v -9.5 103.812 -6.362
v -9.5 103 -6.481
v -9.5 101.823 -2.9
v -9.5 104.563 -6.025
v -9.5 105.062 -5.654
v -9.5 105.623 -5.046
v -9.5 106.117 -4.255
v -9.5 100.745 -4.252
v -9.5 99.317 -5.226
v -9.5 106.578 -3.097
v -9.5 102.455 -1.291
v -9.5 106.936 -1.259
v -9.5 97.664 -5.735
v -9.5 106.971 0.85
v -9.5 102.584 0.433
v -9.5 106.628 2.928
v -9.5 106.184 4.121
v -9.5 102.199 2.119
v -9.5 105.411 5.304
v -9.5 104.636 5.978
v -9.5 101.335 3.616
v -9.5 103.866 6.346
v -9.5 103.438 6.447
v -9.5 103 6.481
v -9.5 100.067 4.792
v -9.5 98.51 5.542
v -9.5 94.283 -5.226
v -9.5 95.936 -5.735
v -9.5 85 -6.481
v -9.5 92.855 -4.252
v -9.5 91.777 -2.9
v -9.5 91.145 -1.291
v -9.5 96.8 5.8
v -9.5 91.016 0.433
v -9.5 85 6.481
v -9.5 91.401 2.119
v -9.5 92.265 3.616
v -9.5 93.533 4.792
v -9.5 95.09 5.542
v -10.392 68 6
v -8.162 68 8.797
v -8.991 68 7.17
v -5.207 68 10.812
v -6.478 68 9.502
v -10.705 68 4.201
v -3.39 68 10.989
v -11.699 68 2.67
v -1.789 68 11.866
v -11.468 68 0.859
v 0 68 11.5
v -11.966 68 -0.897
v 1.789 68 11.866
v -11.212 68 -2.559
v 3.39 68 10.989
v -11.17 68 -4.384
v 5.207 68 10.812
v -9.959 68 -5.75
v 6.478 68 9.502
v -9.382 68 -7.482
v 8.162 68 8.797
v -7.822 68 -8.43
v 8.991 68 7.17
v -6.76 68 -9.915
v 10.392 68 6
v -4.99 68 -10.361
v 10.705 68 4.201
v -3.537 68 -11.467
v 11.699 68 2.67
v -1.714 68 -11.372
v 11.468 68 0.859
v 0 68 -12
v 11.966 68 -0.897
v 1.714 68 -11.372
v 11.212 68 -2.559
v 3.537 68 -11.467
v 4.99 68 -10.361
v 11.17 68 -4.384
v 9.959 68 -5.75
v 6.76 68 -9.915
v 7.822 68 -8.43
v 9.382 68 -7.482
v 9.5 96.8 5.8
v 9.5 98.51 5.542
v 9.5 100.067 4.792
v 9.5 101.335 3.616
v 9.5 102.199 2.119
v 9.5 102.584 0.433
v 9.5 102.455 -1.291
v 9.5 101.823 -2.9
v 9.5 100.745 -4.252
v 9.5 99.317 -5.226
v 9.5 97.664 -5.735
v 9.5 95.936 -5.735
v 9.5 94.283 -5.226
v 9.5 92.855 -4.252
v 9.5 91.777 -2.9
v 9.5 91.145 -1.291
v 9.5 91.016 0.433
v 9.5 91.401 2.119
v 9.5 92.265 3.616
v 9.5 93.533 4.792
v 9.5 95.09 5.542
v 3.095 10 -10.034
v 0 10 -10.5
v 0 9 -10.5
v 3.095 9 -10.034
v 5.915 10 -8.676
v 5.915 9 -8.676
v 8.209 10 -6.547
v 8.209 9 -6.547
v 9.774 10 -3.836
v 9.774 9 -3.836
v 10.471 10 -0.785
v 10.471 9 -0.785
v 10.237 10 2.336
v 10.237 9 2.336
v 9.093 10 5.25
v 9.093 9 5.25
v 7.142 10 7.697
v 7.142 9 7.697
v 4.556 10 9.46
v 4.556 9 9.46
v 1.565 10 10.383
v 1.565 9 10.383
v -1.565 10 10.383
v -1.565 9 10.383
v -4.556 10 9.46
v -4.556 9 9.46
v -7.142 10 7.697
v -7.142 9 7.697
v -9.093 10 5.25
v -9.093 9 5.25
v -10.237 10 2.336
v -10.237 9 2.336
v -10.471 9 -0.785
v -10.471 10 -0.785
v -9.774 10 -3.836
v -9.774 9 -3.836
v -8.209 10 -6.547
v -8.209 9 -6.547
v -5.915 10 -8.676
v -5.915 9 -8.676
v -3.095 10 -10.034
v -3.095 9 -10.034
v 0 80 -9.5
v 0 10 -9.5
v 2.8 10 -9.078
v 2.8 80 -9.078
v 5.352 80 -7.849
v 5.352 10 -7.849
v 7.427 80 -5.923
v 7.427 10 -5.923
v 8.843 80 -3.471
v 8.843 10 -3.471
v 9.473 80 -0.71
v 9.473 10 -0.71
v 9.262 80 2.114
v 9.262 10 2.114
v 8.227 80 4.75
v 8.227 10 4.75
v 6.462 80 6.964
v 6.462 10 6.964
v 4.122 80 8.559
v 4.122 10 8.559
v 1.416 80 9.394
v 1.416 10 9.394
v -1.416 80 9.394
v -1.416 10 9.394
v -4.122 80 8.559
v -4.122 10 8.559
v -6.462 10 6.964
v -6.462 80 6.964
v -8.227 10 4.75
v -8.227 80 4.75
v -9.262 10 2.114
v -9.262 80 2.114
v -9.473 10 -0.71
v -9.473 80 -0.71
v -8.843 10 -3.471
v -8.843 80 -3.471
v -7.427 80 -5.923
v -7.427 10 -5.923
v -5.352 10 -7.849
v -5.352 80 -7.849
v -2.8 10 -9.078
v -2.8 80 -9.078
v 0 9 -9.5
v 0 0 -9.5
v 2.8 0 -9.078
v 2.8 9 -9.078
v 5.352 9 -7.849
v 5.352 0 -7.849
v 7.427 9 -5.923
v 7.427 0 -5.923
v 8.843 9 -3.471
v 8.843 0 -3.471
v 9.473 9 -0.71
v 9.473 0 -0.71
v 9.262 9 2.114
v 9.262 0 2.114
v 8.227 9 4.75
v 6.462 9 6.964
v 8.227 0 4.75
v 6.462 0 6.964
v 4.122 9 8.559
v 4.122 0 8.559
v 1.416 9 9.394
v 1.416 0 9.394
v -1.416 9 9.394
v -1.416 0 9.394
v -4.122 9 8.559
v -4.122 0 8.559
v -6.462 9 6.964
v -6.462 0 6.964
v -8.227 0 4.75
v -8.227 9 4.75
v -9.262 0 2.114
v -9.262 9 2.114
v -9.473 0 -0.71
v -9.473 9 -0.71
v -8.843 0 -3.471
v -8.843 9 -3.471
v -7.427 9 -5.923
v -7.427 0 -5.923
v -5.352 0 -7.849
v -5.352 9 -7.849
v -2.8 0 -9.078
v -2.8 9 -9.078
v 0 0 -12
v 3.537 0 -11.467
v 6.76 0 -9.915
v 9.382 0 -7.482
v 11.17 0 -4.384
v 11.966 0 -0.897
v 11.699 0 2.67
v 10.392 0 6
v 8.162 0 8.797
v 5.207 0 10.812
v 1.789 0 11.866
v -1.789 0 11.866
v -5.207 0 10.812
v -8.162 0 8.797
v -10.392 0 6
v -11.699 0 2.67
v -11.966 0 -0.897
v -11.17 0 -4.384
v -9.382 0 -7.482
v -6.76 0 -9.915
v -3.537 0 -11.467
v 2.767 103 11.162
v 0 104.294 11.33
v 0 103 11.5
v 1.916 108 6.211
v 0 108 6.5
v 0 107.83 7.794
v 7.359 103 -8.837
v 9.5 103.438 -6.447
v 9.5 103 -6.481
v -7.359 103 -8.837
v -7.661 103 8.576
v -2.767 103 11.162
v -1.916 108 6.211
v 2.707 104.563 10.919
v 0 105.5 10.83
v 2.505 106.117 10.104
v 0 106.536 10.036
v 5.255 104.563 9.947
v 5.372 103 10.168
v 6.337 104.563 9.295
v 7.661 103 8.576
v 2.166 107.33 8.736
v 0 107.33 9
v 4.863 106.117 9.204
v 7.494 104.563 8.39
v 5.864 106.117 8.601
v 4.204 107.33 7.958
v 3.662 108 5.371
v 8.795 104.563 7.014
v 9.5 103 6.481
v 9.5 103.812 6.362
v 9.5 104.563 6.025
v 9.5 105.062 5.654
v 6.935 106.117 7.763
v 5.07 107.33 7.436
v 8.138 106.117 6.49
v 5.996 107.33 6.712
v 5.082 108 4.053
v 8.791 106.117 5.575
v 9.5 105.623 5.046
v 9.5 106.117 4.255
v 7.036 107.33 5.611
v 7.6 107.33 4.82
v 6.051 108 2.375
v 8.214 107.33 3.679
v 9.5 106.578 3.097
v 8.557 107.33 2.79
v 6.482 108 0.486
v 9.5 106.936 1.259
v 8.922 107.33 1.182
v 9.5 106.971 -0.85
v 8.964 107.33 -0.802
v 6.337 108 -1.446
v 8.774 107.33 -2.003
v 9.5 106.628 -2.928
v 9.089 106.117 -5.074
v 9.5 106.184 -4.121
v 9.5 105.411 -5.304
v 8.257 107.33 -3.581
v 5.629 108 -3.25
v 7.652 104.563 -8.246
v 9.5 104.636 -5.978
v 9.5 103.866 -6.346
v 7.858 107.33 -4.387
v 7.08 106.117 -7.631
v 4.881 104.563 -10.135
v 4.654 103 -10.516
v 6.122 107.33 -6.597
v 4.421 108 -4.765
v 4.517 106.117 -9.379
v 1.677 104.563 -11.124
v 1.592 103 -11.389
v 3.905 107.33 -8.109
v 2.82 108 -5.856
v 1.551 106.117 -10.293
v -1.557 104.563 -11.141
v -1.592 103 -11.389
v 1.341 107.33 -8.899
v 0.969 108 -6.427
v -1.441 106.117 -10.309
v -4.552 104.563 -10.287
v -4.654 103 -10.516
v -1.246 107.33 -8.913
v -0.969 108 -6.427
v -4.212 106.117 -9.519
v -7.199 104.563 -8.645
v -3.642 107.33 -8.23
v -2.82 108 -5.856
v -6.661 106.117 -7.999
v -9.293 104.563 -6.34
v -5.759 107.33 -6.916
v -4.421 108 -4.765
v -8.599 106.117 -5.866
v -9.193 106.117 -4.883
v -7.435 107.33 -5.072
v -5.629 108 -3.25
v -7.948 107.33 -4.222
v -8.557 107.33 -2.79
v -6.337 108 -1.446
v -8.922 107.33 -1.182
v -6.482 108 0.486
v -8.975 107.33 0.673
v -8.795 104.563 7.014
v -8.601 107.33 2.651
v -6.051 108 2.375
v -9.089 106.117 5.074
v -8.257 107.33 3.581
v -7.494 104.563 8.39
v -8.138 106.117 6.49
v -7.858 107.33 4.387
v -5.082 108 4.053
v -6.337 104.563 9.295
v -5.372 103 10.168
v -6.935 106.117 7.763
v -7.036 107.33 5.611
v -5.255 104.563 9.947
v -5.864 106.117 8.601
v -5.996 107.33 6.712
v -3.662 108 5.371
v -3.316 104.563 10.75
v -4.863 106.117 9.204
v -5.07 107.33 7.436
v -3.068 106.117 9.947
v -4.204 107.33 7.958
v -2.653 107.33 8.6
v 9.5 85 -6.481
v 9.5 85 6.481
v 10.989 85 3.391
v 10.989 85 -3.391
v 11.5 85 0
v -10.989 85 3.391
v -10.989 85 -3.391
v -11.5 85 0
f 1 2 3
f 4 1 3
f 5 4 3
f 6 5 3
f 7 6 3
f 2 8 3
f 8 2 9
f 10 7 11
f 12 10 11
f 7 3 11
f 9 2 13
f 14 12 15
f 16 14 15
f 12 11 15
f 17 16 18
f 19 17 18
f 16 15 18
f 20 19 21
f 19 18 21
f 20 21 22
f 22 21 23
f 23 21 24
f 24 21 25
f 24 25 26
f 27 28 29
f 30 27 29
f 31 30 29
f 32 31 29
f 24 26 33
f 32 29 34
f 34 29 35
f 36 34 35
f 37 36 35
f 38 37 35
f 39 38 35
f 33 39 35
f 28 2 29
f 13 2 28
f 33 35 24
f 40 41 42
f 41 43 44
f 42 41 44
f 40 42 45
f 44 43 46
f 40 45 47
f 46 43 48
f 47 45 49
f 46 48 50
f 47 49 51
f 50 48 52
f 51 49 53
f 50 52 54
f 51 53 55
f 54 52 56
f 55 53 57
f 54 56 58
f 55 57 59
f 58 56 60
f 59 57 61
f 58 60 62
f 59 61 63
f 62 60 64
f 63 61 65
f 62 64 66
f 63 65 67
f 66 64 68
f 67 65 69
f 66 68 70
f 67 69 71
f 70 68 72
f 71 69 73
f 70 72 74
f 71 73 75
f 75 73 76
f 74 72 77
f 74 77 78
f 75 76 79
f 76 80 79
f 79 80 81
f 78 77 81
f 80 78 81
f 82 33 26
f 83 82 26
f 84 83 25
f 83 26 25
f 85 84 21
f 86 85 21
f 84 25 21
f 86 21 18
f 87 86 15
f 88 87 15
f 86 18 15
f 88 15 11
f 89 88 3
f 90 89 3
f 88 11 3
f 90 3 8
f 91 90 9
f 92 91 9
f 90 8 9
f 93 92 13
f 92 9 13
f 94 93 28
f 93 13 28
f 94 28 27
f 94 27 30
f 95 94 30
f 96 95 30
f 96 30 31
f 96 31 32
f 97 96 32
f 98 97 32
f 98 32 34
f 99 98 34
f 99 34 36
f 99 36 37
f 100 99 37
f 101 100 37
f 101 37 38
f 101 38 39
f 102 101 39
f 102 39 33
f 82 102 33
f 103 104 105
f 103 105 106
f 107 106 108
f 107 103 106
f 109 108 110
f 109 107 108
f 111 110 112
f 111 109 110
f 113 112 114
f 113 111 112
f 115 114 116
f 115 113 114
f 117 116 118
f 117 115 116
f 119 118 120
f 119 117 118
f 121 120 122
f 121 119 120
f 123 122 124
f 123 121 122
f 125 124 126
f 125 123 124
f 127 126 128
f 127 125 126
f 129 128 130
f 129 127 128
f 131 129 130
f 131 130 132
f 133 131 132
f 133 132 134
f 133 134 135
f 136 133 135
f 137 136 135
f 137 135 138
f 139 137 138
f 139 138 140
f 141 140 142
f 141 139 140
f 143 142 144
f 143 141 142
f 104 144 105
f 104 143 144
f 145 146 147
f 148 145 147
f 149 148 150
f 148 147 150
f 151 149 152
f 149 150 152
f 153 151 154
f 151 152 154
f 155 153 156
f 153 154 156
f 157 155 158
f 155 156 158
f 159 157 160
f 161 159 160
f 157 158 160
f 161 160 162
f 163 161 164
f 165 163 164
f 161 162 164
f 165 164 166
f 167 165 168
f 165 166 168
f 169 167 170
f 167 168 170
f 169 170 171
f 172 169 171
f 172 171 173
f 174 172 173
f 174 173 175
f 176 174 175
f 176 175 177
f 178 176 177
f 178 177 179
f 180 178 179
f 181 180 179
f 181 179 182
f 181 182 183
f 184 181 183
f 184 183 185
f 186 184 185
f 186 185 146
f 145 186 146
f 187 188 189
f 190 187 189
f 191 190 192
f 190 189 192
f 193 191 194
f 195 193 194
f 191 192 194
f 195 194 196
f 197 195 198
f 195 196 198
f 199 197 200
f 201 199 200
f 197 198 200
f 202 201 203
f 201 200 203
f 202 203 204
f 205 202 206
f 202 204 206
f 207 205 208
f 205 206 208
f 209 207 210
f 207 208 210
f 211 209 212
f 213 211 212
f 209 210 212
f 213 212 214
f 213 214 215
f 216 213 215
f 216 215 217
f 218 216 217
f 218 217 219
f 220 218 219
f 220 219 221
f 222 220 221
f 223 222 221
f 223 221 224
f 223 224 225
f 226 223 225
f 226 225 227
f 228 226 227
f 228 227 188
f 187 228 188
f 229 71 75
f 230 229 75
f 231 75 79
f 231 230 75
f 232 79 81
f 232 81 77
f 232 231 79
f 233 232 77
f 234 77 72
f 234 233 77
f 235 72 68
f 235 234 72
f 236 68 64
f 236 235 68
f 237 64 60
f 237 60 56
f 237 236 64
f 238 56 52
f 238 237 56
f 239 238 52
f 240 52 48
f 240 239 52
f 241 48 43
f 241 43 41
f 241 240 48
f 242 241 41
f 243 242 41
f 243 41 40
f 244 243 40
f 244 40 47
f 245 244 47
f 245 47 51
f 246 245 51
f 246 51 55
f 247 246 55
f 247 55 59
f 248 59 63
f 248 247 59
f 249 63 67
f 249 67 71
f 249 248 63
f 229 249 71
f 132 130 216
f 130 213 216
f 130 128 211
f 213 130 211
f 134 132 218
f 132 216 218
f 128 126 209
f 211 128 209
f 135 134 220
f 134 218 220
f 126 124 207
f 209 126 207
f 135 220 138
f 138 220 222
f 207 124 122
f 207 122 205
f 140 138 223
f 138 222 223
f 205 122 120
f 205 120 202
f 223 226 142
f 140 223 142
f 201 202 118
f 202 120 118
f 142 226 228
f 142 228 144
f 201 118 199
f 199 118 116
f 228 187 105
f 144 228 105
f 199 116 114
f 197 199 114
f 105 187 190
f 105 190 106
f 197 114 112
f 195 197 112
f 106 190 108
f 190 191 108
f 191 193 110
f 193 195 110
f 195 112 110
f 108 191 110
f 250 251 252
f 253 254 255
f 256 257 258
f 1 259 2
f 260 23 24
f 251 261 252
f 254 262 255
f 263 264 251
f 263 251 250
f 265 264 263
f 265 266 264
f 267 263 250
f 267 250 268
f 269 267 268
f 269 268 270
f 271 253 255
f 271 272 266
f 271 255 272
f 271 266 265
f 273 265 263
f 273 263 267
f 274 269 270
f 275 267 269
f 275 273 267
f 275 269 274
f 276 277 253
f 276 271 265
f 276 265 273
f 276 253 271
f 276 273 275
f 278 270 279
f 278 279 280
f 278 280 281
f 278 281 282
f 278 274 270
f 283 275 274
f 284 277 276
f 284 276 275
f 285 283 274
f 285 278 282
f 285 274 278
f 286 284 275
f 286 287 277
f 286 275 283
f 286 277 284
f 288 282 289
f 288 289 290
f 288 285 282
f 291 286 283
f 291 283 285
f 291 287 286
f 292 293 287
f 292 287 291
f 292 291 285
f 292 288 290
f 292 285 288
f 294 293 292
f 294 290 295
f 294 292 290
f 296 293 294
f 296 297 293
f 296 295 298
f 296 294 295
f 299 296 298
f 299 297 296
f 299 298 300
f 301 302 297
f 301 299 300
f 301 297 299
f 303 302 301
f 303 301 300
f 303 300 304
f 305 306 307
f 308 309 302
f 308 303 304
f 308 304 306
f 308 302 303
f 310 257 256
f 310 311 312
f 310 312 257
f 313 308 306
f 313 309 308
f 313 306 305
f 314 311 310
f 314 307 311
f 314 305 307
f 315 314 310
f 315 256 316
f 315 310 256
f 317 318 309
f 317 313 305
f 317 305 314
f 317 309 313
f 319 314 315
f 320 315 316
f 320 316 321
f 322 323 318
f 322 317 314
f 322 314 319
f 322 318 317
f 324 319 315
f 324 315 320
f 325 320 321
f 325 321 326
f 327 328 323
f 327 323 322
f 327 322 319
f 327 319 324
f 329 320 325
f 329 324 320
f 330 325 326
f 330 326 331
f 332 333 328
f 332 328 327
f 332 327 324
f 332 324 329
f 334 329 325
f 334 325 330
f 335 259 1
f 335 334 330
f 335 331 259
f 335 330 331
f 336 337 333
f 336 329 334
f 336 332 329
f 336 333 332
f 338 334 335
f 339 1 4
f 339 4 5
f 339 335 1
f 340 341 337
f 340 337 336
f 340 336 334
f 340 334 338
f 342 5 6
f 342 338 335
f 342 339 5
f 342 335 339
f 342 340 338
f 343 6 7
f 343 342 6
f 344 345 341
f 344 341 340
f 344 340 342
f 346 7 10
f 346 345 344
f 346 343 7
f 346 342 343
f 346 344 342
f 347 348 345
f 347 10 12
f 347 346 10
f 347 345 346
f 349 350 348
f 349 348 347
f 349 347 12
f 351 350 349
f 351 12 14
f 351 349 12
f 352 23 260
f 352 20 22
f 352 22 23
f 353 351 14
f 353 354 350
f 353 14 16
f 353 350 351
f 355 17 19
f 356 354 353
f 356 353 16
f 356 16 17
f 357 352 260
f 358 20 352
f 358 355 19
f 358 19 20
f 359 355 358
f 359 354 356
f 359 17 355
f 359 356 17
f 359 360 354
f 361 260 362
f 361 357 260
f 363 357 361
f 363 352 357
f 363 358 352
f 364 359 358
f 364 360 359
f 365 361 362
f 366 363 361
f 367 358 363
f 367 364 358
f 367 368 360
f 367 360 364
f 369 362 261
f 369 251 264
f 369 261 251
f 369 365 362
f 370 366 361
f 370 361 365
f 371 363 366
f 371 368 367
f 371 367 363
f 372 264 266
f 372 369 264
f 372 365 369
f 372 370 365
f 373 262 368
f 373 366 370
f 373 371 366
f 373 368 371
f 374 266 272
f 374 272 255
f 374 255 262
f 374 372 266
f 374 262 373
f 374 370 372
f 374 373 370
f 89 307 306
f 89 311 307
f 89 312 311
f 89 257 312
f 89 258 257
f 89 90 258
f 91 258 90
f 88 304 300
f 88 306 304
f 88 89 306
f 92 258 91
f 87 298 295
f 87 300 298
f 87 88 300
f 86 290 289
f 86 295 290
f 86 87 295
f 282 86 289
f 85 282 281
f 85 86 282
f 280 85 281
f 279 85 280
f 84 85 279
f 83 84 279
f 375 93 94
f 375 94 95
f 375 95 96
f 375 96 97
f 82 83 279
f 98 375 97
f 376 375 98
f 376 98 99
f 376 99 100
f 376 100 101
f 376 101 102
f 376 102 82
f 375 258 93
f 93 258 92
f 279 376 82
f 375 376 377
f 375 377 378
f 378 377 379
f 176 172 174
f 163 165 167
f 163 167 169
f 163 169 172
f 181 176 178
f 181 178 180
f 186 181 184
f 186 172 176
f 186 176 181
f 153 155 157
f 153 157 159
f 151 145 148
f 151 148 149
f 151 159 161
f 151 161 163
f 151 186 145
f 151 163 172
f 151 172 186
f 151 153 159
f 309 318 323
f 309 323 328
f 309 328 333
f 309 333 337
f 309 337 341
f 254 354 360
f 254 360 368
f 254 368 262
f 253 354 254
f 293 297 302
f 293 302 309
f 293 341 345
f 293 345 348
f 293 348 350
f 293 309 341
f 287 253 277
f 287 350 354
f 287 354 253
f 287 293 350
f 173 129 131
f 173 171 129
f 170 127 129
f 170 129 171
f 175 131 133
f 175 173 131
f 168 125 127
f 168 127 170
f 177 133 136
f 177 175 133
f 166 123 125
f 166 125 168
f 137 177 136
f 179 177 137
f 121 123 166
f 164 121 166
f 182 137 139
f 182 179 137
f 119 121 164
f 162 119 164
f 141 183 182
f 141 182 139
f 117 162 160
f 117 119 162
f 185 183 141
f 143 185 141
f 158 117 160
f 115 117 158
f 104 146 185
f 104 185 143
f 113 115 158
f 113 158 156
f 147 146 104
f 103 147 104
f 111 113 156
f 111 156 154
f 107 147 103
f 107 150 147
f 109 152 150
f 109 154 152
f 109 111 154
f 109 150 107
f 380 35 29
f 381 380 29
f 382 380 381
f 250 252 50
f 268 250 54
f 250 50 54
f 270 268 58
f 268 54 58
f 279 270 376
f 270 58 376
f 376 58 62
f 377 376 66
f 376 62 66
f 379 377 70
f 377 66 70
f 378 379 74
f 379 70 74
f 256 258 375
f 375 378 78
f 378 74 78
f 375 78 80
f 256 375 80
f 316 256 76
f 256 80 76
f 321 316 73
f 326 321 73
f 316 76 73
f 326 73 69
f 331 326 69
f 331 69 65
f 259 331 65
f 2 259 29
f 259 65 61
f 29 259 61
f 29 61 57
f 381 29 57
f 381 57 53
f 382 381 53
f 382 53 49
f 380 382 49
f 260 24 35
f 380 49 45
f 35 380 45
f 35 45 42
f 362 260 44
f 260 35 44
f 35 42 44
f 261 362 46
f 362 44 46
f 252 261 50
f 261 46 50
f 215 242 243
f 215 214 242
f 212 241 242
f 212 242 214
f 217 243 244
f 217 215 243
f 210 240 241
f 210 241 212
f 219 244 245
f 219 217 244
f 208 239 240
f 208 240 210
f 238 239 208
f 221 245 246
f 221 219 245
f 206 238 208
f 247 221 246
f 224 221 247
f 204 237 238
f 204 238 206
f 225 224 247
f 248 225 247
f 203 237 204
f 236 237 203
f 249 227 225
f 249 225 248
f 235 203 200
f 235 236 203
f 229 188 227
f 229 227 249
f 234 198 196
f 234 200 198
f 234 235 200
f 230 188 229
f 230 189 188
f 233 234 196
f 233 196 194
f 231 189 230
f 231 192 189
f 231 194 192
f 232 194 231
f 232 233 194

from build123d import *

# Parameters (mm, degrees)
SKETCH1_R           = 11.5
BOSS_EXTRUDE1_DEPTH = 108
FILLET1_R           = 5
SKETCH2_R           = 9.5
CUT_EXTRUDE1_DEPTH  = 80
CUT_EXTRUDE5_START  = -23
CUT_EXTRUDE5_DEPTH  = 23
SKETCH6_R           = 10.5
CUT_EXTRUDE7_DEPTH  = 1
SKETCH8_R           = 12
SKETCH8_R_2         = 11.5
BOSS_EXTRUDE2_DEPTH = 68
SKETCH9_R           = 5.8
CUT_EXTRUDE8_DEPTH  = 111.771160604


with BuildPart() as part:
    # Sketch1 → Boss-Extrude1 (new body)
    with BuildSketch(Plane(origin=(0, 0, 0), x_dir=(1, 0, 0), z_dir=(0, 1, 0))):
        with Locations(Location((0, 0, 0), (0, 0, 270))):
            Circle(SKETCH1_R)
    extrude(amount=BOSS_EXTRUDE1_DEPTH)

    # Fillet1
    fillet1_edges = [part.edges().sort_by_distance(p)[0] for p in [
        (0, 108, -11.5),
    ]]
    fillet(fillet1_edges, radius=FILLET1_R)

    # Sketch2 → Cut-Extrude1 (cut)
    with BuildSketch(Plane.XZ):
        with Locations(Location((0, 0, 0), (0, 0, 270))):
            Circle(SKETCH2_R)
    extrude(amount=-CUT_EXTRUDE1_DEPTH, mode=Mode.SUBTRACT)

    # Sketch3 → Cut-Extrude5 (cut)
    with BuildSketch(Plane(origin=(0, 108, 0), x_dir=(1, 0, 0), z_dir=(0, 1, 0)).offset(CUT_EXTRUDE5_START)):
        with BuildLine():
            Line((-9.5, 6.480740698), (-9.5, -6.480740698))
            ThreePointArc((-9.5, -6.480740698), (-11.5, 0), (-9.5, 6.480740698))
        make_face()
        with BuildLine():
            Line((9.5, 6.480740698), (9.5, -6.480740698))
            ThreePointArc((9.5, -6.480740698), (11.5, 0), (9.5, 6.480740698))
        make_face()
    extrude(amount=CUT_EXTRUDE5_DEPTH, mode=Mode.SUBTRACT)

    # Sketch6 → Cut-Extrude7 (cut)
    with BuildSketch(Plane.XZ.offset(-10)):
        with Locations(Location((0, 0, 0), (0, 0, 270))):
            Circle(SKETCH6_R)
    extrude(amount=CUT_EXTRUDE7_DEPTH, mode=Mode.SUBTRACT)

    # Sketch8 → Boss-Extrude2 (add)
    with BuildSketch(Plane.XZ):
        with Locations(Location((0, 0, 0), (0, 0, 270))):
            Circle(SKETCH8_R)
        with Locations(Location((0, 0, 0), (0, 0, 270))):
            Circle(SKETCH8_R_2, mode=Mode.SUBTRACT)
    extrude(amount=-BOSS_EXTRUDE2_DEPTH)

    # Sketch9 → Cut-Extrude8 (cut, through all)
    with BuildSketch(Plane.ZY.offset(9.5)):
        with Locations((0, 96.8)):
            Circle(SKETCH9_R)
    extrude(amount=-CUT_EXTRUDE8_DEPTH, mode=Mode.SUBTRACT)


solid = part.part
